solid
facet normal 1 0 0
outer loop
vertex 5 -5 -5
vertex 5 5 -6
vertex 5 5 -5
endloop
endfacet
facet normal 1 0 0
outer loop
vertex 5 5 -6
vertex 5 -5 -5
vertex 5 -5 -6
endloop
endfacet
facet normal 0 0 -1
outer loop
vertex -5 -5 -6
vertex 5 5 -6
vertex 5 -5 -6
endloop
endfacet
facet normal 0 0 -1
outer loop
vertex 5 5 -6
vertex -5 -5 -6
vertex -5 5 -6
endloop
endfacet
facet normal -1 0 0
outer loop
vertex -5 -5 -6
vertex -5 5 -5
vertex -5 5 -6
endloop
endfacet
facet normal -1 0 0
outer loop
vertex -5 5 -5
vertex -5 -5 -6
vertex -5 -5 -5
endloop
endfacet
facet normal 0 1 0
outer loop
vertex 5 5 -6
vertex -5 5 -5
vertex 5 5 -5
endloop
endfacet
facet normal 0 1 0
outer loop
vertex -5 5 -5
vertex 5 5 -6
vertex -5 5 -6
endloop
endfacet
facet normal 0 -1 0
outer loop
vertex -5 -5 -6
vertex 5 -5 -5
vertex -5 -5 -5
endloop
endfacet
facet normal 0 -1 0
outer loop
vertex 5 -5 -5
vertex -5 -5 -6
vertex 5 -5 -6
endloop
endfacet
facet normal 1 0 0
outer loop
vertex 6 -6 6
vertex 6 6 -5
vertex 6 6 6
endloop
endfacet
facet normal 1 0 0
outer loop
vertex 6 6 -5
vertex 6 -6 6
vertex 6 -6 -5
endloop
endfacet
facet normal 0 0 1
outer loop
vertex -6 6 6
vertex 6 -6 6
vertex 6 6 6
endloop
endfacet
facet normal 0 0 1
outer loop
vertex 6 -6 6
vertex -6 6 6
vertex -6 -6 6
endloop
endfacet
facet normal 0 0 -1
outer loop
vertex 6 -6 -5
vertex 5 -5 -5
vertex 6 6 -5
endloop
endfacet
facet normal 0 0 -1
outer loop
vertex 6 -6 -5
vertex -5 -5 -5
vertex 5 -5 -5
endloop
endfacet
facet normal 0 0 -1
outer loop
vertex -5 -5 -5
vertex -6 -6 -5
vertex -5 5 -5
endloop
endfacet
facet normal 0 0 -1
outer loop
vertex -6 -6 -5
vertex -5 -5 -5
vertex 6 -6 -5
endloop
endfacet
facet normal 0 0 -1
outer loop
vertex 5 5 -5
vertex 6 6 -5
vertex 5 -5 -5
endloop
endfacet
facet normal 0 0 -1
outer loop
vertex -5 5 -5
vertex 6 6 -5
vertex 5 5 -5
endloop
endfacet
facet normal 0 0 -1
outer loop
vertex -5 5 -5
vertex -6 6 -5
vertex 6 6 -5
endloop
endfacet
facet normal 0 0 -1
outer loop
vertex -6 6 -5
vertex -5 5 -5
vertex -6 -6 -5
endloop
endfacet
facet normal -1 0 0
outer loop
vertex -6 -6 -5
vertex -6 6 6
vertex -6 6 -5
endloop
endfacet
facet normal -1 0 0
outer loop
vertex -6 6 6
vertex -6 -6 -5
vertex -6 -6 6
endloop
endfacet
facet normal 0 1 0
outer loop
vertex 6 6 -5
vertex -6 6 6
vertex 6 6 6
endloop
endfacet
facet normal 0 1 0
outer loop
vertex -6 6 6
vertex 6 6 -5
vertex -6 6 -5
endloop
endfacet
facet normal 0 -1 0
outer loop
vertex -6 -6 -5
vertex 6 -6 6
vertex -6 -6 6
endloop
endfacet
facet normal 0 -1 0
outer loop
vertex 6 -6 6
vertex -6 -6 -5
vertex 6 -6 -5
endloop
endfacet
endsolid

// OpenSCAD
// Unit of length: Unit.MM
union()
{
   color(c = [1.0, 0.0, 0.0, 1.0])
   {
      translate(v = [0.0, 0.0, -0.5])
      {
         cube(size = [10.0, 10.0, 11.0], center = true);
      }
   }
   translate(v = [0.0, 0.0, 0.5])
   {
      cube(size = [12.0, 12.0, 11.0], center = true);
   }
}
